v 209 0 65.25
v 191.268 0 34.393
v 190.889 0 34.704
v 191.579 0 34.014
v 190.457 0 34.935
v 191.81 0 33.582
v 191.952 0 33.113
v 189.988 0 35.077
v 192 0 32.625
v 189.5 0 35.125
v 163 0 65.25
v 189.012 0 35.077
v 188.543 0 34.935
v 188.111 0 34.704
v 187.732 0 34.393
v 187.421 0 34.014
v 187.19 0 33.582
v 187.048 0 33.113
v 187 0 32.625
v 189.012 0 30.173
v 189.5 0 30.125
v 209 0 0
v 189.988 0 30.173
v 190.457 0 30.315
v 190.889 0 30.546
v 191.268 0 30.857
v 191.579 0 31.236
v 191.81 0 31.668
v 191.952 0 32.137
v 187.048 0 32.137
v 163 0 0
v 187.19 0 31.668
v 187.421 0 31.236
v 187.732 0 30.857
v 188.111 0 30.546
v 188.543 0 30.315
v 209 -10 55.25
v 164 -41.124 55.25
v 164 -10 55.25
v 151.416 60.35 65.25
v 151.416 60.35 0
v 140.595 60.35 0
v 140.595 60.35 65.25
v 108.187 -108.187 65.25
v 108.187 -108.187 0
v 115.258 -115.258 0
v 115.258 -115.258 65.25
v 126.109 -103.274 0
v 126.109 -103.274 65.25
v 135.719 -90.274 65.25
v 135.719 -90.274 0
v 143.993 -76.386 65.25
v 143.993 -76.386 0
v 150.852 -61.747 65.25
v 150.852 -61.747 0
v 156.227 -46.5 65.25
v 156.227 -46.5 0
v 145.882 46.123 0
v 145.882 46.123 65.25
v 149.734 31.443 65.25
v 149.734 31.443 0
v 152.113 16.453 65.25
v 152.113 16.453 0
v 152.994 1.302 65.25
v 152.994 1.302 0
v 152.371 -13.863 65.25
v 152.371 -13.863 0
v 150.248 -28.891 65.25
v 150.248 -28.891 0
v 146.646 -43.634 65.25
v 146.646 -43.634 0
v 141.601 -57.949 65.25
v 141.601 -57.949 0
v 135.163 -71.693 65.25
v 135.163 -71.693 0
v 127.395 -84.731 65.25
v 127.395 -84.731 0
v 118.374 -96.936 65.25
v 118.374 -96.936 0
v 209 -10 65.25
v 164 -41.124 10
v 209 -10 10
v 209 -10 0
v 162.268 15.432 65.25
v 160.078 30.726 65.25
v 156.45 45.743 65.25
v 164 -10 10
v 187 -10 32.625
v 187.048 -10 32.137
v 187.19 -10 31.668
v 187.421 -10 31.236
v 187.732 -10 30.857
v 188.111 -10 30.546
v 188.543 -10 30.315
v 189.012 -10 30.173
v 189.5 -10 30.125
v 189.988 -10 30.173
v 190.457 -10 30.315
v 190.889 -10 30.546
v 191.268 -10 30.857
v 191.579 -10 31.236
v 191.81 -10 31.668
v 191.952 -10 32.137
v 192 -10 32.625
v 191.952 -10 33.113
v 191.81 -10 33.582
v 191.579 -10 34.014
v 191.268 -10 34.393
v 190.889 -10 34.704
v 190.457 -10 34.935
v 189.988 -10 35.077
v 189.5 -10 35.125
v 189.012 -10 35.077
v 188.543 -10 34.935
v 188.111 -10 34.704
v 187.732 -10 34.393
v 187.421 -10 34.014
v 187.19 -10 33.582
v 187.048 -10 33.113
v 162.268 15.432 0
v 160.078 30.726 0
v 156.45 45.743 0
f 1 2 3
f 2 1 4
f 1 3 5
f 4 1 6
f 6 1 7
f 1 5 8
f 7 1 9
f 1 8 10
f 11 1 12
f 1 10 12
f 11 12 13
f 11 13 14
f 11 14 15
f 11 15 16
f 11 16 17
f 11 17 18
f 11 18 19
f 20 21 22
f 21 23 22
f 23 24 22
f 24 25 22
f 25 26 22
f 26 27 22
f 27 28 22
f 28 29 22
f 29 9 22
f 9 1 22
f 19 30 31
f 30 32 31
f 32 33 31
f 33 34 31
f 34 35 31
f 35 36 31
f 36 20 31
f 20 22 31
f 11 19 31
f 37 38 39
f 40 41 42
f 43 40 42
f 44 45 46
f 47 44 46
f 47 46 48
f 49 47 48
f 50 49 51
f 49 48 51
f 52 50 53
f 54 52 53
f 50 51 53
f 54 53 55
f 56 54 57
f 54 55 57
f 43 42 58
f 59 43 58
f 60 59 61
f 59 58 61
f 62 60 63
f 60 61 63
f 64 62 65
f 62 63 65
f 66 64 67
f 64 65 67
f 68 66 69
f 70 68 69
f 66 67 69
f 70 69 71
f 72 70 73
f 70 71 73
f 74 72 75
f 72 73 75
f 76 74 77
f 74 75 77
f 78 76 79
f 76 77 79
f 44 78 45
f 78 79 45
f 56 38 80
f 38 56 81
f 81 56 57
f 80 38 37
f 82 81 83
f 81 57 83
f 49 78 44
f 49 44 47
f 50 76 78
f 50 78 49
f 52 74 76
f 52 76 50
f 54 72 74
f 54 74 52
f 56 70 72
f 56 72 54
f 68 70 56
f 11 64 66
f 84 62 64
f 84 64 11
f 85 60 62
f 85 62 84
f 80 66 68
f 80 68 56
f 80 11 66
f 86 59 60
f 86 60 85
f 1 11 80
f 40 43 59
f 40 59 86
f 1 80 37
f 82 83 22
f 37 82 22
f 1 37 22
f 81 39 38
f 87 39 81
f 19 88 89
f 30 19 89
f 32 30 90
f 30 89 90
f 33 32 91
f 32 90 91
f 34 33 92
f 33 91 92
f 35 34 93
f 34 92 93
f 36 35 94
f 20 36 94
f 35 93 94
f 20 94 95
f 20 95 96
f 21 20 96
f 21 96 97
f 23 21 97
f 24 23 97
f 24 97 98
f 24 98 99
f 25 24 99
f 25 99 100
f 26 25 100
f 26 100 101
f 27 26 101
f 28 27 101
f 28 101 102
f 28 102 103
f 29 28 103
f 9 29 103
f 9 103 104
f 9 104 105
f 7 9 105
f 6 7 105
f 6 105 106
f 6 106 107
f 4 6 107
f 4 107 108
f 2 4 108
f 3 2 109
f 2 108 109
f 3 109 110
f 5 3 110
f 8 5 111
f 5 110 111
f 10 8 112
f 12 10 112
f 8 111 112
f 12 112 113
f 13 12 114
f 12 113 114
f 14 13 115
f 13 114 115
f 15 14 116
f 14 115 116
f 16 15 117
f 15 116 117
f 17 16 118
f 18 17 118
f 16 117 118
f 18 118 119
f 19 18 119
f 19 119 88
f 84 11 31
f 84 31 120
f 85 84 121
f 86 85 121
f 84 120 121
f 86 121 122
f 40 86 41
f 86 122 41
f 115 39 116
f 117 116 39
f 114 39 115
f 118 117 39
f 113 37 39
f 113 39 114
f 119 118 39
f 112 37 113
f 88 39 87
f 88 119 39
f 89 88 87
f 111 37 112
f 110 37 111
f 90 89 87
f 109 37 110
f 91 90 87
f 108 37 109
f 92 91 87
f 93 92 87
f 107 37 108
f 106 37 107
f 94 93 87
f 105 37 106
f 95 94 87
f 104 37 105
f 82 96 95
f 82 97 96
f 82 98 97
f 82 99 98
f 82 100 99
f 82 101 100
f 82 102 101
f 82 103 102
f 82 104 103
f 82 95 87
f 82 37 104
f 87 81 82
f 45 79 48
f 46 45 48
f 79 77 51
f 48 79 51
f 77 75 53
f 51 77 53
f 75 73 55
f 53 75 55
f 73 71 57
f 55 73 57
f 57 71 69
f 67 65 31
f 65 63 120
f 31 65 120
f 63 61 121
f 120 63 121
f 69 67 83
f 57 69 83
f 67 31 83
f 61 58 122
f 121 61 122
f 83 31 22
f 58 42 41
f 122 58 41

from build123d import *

# Parameters (mm, degrees)
SALIENTE_EXTRUIR1_DEPTH = 65.25
CROQUIS3_W              = 45.25
CROQUIS3_H              = 36.500322872
CORTAR_EXTRUIR1_DEPTH   = 45
CROQUIS5_R              = 2.5
CORTAR_EXTRUIR3_DEPTH   = 45
CROQUIS9_R              = 2.5
CORTAR_EXTRUIR5_DEPTH   = 45


with BuildPart() as part:
    # Croquis1 → Saliente-Extruir1 (new body)
    with BuildSketch(Plane.XY):
        with BuildLine():
            Line((209, 0), (163, 0))
            ThreePointArc((163, 0), (160.07788224, 30.725748448), (151.41629917, 60.349849592))
            Line((151.41629917, 60.349849592), (140.594792415, 60.349849592))
            ThreePointArc((140.594792415, 60.349849592), (150.24757204, -28.890605671), (108.187337522, -108.187337522))
            Line((108.187337522, -108.187337522), (115.258405333, -115.258405333))
            ThreePointArc((115.258405333, -115.258405333), (140.028326503, -83.43301371), (156.226502146, -46.500322872))
            Line((156.226502146, -46.500322872), (209, -10))
            Line((209, -10), (209, 0))
        make_face()
    extrude(amount=SALIENTE_EXTRUIR1_DEPTH)

    # Croquis3 → Cortar-Extruir1 (cut)
    with BuildSketch(Plane(origin=(209, 0, 0), x_dir=(0, 0, -1), z_dir=(1, 0, 0))):
        with Locations((-32.625, -28.250161436)):
            Rectangle(CROQUIS3_W, CROQUIS3_H)
    extrude(amount=-CORTAR_EXTRUIR1_DEPTH, mode=Mode.SUBTRACT)

    # Croquis5 → Cortar-Extruir3 (cut)
    with BuildSketch(Plane(origin=(10, 0, 0), x_dir=(0, 0, -1), z_dir=(1, 0, 0))):
        with Locations((-32.625, -172.846481178)):
            Circle(CROQUIS5_R)
    extrude(amount=-CORTAR_EXTRUIR3_DEPTH, mode=Mode.SUBTRACT)

    # Croquis9 → Cortar-Extruir5 (cut)
    with BuildSketch(Plane(origin=(0, -10, 0), x_dir=(-1, 0, 0), z_dir=(0, -1, 0))):
        with Locations((-189.5, -32.625)):
            Circle(CROQUIS9_R)
    extrude(amount=-CORTAR_EXTRUIR5_DEPTH, mode=Mode.SUBTRACT)


solid = part.part
